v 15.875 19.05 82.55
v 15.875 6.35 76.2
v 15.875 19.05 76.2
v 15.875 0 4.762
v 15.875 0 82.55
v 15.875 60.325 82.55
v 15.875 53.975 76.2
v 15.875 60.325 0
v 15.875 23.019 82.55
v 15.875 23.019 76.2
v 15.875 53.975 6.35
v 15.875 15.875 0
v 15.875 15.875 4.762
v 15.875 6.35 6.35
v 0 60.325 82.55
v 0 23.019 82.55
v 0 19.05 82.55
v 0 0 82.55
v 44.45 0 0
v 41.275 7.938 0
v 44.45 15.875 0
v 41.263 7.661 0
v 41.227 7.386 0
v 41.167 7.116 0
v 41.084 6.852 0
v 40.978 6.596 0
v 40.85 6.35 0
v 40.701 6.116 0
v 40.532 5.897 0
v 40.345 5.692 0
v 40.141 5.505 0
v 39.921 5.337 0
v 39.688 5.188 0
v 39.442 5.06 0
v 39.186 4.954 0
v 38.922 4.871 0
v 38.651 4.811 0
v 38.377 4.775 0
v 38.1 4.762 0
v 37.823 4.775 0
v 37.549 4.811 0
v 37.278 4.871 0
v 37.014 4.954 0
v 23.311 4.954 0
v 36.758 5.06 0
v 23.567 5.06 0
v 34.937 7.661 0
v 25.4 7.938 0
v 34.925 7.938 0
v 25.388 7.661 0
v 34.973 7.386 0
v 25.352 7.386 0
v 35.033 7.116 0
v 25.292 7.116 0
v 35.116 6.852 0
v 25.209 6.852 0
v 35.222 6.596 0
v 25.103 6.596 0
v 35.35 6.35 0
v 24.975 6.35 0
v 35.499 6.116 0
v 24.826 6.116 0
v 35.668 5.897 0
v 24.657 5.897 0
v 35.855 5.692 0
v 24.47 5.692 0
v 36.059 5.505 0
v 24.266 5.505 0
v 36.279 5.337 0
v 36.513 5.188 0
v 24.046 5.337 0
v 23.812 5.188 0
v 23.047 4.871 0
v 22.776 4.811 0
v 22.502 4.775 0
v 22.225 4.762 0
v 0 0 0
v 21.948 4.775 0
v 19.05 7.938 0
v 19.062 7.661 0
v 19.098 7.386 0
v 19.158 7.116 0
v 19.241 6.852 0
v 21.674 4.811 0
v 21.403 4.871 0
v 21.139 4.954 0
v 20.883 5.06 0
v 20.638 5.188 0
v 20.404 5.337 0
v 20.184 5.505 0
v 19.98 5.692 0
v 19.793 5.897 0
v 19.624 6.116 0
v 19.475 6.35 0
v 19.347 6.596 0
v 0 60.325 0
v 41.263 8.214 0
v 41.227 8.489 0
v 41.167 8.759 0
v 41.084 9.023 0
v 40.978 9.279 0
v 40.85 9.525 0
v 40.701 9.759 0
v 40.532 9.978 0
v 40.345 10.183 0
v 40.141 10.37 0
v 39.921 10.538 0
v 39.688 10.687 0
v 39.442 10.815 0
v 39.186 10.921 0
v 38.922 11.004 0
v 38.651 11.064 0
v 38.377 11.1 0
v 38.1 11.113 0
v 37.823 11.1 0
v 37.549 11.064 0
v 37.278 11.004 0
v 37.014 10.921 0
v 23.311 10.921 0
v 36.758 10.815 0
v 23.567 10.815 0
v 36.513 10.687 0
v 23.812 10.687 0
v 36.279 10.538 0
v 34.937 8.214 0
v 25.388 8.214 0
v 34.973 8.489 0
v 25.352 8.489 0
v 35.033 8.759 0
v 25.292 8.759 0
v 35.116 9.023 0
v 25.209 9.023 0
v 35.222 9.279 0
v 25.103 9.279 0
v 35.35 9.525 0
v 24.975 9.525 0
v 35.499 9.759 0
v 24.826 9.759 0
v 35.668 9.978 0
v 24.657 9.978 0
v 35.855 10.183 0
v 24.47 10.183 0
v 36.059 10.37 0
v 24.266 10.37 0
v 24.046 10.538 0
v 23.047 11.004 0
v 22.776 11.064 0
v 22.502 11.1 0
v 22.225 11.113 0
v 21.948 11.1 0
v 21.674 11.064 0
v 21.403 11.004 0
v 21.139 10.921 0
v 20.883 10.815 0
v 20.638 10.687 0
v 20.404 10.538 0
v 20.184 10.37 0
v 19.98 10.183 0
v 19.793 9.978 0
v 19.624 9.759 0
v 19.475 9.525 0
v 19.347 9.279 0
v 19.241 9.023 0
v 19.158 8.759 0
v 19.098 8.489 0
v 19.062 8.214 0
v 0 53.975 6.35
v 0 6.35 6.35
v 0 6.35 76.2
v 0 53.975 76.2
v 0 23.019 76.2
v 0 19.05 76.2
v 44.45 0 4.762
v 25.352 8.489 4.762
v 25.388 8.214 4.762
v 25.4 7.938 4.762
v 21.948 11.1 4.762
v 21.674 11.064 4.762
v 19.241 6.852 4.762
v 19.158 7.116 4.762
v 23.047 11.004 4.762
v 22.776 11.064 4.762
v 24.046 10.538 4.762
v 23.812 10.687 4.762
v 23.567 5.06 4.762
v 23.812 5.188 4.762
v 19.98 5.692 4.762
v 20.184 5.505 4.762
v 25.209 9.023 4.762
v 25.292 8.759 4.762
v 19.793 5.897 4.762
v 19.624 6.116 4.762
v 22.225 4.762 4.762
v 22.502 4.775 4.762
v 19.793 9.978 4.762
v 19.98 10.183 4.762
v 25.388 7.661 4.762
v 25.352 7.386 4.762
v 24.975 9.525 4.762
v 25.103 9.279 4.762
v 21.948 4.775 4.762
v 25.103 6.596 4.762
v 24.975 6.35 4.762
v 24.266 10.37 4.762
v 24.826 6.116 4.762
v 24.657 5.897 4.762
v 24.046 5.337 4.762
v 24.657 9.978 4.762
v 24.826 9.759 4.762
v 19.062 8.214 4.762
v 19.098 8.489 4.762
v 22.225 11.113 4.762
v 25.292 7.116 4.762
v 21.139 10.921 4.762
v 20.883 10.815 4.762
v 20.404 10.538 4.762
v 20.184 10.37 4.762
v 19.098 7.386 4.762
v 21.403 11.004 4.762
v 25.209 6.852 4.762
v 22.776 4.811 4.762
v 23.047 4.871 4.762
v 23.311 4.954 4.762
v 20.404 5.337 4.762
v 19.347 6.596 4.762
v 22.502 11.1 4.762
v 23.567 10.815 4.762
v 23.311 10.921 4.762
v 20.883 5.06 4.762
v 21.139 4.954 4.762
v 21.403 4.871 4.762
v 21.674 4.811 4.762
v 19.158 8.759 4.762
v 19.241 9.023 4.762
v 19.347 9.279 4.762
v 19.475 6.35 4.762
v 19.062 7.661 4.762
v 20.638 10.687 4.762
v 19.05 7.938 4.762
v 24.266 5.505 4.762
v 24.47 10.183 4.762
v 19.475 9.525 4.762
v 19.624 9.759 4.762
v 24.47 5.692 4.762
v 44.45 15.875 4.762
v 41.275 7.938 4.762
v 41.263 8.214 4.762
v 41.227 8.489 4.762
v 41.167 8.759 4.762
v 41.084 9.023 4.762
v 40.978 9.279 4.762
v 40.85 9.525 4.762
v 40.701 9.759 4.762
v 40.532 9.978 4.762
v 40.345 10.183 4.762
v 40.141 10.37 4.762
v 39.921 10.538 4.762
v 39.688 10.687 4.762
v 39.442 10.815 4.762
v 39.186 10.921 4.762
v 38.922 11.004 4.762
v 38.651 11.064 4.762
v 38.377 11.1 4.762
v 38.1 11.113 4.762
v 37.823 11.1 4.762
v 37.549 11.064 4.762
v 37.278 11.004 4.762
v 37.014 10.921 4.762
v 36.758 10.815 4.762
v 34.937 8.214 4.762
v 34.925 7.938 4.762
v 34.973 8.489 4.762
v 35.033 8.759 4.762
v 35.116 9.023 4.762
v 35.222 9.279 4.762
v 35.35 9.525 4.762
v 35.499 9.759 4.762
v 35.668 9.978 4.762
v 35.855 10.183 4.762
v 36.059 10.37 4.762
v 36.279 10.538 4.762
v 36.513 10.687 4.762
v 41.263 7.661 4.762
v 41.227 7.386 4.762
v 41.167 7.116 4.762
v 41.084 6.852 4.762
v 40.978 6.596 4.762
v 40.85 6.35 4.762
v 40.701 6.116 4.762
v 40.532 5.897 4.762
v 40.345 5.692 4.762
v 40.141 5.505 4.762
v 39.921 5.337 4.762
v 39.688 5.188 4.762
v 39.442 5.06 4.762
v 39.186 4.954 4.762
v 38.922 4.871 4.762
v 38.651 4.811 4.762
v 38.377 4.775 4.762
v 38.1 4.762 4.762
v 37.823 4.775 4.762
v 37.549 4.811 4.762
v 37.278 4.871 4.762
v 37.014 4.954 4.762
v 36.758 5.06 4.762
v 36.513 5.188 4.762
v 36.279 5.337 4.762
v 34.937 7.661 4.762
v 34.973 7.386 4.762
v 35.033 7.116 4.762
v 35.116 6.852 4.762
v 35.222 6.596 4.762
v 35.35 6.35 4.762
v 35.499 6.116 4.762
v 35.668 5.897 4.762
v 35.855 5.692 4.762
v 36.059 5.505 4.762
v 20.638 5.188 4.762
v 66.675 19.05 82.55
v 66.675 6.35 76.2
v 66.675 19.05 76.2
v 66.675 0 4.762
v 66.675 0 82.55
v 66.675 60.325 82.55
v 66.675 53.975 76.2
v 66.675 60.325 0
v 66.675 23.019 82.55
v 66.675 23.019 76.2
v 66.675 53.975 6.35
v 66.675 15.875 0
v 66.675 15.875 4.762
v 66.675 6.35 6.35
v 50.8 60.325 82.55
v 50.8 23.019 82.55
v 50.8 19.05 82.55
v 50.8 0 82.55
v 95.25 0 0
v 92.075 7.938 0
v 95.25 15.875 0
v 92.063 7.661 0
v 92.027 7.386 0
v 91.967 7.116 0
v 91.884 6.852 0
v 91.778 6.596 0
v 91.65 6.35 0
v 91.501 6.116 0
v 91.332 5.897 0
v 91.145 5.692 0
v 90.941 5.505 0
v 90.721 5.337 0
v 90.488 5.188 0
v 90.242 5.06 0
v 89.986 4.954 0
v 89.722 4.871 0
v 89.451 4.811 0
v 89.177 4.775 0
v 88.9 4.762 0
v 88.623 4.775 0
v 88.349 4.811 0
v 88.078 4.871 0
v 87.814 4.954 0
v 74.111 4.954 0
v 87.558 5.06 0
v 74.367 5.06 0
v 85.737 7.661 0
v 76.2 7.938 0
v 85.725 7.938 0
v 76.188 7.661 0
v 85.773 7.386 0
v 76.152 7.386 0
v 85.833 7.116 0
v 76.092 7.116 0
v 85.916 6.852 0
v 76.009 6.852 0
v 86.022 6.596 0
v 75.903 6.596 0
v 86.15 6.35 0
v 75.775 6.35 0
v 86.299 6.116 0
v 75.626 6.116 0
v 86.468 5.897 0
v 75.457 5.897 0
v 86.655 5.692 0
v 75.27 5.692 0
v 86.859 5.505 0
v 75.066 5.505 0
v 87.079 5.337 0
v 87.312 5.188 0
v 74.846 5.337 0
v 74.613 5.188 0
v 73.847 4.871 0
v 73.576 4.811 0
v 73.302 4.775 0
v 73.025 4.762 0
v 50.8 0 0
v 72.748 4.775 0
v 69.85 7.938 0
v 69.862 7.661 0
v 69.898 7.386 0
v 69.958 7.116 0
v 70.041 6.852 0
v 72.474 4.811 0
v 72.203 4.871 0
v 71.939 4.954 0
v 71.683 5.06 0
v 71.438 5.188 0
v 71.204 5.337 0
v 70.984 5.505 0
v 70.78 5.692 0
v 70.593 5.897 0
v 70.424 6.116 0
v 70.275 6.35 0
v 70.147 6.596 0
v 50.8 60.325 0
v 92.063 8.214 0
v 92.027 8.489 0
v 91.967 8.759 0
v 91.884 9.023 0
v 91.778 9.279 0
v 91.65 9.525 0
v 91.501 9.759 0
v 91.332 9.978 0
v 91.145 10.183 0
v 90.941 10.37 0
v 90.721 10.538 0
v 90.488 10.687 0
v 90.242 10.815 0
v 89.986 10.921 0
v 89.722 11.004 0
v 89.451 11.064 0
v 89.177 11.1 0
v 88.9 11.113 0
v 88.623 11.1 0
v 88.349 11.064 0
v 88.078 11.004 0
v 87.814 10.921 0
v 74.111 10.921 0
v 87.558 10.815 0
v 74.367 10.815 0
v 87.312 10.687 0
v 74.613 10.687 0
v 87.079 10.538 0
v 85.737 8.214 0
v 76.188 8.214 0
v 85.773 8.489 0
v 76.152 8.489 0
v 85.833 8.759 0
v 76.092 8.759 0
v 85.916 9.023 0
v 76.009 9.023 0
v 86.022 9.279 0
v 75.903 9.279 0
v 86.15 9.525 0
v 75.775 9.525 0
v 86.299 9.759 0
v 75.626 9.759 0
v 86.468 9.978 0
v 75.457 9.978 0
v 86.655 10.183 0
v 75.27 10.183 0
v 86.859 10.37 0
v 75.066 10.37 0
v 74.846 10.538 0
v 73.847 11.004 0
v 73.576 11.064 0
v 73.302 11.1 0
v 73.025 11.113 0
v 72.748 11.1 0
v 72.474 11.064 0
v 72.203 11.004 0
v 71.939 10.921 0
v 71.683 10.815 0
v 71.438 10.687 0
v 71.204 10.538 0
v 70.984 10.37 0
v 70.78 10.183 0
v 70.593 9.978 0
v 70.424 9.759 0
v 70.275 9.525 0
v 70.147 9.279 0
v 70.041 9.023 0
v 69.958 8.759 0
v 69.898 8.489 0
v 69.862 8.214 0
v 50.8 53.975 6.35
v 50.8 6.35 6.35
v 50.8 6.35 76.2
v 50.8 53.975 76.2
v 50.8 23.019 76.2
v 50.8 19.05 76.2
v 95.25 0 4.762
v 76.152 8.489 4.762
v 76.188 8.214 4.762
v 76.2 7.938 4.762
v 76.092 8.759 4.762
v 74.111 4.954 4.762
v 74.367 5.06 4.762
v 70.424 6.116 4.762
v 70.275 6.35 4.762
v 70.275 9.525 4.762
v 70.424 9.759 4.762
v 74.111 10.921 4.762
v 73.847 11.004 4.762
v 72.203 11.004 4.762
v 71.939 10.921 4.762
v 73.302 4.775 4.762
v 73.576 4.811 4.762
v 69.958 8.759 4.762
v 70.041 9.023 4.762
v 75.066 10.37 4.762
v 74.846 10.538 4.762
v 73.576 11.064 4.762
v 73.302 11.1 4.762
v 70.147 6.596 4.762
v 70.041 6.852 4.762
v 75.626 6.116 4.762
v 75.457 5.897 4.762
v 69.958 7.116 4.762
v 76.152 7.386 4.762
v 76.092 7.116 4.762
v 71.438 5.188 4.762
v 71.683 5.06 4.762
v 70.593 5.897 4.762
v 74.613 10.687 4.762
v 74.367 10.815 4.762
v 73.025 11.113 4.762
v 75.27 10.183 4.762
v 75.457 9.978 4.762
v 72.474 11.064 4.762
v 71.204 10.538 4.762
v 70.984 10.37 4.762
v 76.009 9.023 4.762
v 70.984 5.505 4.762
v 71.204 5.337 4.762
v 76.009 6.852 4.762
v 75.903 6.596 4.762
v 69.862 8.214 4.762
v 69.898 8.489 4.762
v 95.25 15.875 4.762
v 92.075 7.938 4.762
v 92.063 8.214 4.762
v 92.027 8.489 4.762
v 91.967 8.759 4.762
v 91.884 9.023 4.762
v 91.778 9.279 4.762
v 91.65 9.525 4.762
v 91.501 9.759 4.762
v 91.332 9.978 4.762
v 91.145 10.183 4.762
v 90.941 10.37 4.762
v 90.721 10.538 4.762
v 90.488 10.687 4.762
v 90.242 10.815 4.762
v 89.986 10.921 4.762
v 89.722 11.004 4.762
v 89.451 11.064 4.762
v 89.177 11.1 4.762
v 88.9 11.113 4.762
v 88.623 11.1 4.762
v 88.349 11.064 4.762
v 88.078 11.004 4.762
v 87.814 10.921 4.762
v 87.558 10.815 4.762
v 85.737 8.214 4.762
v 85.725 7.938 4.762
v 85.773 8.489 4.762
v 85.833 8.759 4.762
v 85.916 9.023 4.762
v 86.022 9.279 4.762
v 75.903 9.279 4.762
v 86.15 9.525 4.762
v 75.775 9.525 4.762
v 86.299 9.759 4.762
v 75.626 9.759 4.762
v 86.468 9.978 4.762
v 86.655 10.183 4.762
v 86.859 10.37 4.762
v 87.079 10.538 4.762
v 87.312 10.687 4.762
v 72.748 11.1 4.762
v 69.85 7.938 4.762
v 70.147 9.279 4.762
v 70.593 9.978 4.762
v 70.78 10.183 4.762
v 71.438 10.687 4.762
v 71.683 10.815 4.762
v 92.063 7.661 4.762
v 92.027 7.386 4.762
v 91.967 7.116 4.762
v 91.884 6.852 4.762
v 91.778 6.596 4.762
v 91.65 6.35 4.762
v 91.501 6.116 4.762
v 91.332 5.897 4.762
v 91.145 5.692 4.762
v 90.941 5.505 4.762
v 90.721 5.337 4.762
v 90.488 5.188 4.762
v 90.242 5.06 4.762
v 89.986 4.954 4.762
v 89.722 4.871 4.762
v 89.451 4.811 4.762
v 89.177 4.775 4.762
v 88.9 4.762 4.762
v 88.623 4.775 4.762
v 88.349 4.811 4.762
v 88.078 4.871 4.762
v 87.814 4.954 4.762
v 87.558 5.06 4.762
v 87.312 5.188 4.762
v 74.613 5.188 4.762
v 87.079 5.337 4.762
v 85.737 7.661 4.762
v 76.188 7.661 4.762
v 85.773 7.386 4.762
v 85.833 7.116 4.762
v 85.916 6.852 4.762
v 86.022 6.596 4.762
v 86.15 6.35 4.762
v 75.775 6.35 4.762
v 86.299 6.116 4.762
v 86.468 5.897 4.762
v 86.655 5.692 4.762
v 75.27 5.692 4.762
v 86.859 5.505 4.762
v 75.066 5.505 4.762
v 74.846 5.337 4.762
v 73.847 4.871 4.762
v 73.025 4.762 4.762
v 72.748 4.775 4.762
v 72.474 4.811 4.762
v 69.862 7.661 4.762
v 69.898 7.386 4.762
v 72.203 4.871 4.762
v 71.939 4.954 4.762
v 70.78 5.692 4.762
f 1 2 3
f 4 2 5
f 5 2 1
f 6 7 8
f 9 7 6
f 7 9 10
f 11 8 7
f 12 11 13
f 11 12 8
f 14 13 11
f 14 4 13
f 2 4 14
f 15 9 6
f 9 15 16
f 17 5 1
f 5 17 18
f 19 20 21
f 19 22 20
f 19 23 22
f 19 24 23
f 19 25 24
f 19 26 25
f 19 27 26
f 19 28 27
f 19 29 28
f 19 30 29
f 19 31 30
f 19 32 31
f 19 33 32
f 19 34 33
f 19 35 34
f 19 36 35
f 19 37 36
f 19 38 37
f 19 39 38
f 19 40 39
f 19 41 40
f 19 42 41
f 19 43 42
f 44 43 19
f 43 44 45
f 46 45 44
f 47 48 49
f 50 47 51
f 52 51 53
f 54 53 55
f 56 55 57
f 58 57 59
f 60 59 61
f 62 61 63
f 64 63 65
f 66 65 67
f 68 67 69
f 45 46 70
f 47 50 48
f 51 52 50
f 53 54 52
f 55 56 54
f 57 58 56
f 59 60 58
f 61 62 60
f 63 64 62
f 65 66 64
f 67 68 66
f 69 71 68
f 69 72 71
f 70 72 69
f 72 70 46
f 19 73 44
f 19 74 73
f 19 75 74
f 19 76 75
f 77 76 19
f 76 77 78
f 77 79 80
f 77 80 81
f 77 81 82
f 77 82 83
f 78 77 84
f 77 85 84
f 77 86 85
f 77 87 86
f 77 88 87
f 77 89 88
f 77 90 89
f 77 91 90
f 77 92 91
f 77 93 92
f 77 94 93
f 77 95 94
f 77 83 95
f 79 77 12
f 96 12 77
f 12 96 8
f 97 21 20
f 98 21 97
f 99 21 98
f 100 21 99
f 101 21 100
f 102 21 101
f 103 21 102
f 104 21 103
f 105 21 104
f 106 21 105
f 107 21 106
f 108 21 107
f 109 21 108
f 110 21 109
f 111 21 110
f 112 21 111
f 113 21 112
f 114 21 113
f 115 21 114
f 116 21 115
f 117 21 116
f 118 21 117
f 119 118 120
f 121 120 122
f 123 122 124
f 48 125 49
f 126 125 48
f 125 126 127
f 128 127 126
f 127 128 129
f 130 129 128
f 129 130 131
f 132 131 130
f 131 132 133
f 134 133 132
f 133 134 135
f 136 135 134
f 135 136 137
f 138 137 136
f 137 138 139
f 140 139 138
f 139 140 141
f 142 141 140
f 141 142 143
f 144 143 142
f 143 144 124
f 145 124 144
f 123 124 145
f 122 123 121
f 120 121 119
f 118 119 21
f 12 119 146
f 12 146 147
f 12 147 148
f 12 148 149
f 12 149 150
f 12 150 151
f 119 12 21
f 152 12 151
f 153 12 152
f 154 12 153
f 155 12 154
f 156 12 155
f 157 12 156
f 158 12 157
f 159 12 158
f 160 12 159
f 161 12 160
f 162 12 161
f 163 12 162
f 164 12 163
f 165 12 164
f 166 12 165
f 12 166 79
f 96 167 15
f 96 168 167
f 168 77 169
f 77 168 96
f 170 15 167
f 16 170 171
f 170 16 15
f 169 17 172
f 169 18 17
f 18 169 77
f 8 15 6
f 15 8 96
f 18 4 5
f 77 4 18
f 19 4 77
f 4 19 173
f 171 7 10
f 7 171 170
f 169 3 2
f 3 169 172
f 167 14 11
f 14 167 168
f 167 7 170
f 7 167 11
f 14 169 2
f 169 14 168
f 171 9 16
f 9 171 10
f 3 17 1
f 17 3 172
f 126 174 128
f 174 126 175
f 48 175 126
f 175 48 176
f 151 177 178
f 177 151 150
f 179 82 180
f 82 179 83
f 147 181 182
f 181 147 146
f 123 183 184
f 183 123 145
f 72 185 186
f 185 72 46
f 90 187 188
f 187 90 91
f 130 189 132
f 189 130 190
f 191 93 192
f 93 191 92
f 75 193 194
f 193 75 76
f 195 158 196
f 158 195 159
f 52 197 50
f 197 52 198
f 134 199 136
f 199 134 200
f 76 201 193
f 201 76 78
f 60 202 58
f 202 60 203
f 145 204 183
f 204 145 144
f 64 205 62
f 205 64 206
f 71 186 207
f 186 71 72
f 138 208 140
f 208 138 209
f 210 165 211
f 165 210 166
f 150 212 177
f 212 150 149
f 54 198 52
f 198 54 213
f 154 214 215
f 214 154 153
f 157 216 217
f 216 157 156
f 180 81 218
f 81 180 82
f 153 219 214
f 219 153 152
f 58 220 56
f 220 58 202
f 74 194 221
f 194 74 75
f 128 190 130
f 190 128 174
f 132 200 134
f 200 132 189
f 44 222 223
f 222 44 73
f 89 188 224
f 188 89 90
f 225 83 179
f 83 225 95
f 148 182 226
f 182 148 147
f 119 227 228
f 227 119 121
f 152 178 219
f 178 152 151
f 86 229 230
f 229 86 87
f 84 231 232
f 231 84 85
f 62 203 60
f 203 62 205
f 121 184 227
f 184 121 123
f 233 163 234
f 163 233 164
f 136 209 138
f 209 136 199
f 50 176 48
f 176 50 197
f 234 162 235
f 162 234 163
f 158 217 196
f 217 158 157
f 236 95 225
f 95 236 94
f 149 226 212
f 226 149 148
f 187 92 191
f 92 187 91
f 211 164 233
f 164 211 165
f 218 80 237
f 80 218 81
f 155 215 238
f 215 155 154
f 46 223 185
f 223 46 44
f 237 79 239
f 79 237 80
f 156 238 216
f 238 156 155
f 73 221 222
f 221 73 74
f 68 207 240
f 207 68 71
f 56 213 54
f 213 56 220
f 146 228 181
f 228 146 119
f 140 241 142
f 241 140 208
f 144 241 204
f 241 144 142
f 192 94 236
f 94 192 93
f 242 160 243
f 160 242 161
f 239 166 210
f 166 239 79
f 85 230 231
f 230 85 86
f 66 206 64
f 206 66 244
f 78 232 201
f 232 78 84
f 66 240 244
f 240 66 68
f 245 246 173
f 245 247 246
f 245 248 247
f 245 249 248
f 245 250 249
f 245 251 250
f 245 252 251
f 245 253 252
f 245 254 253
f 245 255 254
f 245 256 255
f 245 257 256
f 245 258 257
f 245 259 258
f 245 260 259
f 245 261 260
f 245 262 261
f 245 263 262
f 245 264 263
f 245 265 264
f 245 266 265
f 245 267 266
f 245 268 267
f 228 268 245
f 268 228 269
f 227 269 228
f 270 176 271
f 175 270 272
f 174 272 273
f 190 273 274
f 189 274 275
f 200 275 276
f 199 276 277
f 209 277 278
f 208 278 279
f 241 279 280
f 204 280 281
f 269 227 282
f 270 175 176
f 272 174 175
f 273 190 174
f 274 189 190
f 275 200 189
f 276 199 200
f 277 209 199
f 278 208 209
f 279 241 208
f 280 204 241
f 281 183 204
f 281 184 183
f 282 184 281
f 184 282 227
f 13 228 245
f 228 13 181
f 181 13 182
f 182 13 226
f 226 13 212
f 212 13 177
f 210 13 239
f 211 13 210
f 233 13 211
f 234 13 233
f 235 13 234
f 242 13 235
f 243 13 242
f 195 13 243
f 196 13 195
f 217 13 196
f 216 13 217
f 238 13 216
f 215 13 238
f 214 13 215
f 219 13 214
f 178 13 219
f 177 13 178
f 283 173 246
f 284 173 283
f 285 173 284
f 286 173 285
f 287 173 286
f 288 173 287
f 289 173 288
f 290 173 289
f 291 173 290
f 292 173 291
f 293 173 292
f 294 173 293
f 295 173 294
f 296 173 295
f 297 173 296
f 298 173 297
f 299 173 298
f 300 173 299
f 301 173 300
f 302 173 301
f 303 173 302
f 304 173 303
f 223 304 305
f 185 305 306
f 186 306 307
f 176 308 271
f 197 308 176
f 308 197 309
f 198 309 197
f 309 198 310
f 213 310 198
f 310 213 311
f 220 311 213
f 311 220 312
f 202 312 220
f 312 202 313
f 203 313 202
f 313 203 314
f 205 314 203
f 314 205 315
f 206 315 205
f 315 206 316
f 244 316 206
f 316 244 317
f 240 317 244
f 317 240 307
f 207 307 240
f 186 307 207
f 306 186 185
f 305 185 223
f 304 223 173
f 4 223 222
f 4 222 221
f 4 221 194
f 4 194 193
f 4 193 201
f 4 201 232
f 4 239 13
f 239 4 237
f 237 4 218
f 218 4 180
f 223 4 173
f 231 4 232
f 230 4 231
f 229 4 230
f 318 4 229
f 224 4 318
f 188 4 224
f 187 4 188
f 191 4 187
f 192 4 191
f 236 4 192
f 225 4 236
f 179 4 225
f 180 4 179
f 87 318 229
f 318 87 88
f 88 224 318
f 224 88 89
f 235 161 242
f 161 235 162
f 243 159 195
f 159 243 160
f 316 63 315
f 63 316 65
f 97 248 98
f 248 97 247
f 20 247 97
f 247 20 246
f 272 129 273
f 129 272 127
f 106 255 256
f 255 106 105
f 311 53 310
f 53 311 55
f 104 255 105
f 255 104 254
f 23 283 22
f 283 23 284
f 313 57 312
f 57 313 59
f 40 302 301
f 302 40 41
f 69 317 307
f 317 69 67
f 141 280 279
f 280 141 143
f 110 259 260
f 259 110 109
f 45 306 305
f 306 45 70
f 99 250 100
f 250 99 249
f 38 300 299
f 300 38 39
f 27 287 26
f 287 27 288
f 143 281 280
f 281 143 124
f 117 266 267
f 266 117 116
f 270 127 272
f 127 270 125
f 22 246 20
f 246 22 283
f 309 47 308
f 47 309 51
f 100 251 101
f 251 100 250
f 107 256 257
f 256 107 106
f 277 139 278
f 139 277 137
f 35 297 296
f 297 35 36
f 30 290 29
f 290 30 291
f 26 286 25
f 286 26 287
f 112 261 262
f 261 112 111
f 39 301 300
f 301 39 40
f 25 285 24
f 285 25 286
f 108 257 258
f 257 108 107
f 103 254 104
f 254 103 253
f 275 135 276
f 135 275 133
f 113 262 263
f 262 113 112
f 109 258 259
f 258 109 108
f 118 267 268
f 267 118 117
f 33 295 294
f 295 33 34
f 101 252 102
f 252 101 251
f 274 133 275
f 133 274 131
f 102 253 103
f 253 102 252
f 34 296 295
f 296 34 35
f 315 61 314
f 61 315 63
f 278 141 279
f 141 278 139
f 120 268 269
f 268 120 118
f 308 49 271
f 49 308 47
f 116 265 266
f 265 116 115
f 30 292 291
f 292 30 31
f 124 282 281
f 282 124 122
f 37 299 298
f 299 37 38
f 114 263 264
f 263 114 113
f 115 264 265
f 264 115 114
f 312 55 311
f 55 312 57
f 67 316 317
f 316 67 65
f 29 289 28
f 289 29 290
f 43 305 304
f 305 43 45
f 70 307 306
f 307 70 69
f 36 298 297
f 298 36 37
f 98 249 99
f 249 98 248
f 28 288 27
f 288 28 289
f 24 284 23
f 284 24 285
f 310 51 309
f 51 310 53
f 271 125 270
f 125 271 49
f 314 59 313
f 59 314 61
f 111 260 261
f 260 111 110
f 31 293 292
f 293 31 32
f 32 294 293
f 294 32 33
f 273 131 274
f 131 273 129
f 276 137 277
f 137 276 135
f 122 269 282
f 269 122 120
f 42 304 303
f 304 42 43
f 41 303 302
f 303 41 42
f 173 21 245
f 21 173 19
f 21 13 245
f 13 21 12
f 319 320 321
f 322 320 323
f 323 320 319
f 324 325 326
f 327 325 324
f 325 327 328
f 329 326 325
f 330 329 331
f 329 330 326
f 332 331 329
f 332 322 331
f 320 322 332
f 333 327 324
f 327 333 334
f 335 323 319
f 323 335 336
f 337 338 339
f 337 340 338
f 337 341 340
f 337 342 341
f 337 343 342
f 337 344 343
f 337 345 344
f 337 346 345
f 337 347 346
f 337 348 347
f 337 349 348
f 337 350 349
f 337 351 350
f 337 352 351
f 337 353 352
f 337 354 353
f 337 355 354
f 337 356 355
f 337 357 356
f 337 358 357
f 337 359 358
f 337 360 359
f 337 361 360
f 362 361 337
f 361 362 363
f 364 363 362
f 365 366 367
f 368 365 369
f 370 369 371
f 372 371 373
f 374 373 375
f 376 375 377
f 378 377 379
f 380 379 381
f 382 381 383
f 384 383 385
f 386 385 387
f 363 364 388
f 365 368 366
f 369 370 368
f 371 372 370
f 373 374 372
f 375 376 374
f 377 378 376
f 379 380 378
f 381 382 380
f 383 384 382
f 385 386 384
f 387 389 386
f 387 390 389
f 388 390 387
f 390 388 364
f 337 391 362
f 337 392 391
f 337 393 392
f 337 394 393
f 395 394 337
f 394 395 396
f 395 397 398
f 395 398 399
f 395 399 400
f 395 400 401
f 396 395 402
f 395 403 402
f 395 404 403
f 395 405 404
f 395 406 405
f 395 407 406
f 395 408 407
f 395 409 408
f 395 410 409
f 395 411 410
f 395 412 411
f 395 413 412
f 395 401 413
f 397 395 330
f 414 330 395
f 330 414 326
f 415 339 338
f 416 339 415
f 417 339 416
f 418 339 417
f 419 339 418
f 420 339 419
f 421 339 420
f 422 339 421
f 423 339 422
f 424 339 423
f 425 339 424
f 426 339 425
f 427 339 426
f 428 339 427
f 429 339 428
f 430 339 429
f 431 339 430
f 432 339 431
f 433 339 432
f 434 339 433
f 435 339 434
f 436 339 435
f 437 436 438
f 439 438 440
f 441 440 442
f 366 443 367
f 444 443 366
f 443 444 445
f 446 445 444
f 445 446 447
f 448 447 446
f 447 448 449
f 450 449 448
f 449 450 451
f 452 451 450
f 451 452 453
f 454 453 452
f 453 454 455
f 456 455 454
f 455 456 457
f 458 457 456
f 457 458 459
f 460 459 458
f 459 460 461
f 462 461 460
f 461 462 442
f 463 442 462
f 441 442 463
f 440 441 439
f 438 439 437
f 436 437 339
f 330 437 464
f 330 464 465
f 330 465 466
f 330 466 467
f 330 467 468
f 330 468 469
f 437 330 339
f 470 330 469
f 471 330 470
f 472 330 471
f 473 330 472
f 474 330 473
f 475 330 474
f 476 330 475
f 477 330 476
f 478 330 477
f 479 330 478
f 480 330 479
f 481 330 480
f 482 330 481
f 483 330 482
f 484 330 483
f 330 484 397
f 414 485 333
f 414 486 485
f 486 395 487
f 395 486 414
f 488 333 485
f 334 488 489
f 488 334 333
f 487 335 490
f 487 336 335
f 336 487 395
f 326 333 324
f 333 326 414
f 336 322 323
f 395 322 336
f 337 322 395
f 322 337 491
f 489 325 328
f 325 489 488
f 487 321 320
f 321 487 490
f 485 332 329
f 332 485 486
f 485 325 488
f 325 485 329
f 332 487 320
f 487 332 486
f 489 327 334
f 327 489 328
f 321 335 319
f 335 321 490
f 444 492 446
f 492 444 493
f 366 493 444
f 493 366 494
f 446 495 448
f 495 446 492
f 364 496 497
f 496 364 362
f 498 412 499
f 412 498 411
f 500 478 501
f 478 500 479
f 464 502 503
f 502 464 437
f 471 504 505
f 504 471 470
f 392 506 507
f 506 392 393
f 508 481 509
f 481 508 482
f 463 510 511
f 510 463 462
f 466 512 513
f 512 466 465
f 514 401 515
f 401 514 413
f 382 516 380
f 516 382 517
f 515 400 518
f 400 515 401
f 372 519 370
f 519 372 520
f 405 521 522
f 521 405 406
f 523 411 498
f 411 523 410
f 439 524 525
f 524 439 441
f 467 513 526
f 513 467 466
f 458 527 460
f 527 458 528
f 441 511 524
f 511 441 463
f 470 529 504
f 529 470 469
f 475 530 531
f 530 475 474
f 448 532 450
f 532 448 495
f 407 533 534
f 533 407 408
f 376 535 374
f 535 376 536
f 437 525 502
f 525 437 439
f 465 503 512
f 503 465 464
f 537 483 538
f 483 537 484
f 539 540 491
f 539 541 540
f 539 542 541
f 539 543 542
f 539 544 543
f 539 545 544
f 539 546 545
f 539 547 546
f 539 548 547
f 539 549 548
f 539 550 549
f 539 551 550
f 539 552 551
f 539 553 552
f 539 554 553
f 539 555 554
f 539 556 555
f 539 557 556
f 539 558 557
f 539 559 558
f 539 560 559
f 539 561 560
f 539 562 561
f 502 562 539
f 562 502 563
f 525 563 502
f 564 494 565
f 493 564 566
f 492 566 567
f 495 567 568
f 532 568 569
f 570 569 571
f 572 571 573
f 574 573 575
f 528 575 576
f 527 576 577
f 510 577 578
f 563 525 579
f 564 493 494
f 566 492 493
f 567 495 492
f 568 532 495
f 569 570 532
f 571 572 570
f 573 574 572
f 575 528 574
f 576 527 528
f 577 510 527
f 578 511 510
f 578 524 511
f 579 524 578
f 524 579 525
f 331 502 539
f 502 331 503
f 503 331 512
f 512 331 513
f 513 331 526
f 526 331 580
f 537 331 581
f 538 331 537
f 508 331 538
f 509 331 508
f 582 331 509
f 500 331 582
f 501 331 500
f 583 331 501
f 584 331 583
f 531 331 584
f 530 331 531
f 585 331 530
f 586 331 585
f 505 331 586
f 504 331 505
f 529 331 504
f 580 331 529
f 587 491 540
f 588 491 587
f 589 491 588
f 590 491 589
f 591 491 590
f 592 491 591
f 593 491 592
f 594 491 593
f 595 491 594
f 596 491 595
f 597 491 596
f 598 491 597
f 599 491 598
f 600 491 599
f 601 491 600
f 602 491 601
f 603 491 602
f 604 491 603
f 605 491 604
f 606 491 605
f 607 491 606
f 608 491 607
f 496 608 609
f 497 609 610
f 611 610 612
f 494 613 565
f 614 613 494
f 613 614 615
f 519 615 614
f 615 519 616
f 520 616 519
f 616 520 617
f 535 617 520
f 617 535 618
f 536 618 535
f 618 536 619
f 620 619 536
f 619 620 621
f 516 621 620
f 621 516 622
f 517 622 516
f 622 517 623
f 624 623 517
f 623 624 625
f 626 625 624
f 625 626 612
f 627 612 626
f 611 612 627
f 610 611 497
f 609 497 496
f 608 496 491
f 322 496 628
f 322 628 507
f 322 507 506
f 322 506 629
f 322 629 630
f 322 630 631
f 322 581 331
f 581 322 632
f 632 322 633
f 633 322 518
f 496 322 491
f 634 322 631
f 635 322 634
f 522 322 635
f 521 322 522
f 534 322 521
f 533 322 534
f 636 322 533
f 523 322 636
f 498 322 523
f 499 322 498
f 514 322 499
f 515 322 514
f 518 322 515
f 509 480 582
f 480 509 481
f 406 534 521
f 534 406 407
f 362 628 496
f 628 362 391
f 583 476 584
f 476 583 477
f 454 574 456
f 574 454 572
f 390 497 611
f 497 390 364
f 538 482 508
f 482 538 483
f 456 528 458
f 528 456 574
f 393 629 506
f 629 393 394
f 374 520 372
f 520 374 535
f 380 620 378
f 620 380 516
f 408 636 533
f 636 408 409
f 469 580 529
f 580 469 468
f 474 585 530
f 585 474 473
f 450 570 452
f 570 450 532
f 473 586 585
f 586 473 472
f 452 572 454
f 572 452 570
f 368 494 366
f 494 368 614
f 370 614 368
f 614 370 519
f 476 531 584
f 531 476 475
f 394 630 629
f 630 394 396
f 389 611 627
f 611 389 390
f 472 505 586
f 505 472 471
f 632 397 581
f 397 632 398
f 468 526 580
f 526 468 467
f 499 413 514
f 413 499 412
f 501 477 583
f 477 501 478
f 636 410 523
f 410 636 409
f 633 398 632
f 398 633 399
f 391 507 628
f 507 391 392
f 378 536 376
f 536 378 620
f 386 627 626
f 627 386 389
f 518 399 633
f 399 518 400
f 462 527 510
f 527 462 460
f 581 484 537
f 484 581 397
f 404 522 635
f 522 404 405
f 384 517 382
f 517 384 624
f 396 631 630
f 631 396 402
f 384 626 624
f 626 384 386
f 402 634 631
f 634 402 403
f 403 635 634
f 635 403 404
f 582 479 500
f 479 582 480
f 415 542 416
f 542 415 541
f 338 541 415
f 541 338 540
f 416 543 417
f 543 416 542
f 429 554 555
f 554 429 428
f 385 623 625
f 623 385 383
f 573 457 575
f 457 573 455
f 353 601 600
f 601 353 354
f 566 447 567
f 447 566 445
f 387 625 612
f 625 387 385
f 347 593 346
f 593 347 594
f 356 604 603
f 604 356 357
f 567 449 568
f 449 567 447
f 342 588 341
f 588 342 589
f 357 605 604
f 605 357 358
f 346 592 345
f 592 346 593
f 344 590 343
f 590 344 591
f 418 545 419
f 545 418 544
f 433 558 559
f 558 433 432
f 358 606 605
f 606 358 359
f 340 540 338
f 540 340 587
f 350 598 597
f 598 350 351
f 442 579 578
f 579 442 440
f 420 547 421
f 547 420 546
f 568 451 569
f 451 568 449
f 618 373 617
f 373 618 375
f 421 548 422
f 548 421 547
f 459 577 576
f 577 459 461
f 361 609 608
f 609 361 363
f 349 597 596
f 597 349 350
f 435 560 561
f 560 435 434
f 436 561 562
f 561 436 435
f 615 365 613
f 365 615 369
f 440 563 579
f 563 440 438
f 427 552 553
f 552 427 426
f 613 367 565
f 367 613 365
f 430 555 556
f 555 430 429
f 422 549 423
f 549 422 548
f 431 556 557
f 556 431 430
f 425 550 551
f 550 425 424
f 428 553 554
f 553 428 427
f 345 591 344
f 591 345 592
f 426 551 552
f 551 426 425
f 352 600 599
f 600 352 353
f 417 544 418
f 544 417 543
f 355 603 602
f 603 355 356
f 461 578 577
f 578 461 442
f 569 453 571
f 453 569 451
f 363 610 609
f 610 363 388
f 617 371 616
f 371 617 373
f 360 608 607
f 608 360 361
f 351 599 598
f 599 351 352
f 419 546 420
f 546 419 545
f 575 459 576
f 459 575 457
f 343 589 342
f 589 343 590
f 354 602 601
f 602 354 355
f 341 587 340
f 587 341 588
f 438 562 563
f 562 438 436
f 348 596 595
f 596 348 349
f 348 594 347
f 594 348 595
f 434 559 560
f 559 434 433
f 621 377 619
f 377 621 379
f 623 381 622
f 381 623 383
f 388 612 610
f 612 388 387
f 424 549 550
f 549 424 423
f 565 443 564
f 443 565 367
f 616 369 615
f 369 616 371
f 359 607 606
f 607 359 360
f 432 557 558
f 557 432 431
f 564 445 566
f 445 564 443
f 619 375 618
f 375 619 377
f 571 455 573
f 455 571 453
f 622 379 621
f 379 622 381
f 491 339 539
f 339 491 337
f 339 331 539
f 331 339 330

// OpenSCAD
$fn = 72;

scale([25.4, 25.4, 25.4]) {
difference() {
	cube([5/8, 19/8, 13/4]);
	translate([0, 1/4, 1/4]) cube([5/8, 15/8, 11/4]);
	translate([0, 3/4, 3]) cube([5/8, 5/32, 1/2]);
}
difference() {
	cube([7/4, 5/8, 3/16]);
	translate([7/8, 5/16, 3/32]) {
		cylinder(h=3/16, d=1/4, center=true);
		translate([5/8, 0, 0]) cylinder(h=3/16, d=1/4,center=true);
	}
}
}


scale([25.4/32, 25.4/32, 25.4/32]) translate([64, 0, 0]) {
difference() {
	cube([20, 76, 104]);
	translate([0, 8, 8]) cube([20, 60, 88]);
	translate([0, 24, 96]) cube([20, 5, 16]);
}
difference() {
	cube([56, 20, 6]);
	translate([28, 10, 3]) {
		cylinder(h=6, d=8, center=true);
		translate([20, 0, 0]) cylinder(h=6, d=8,center=true);
	}
}
}
